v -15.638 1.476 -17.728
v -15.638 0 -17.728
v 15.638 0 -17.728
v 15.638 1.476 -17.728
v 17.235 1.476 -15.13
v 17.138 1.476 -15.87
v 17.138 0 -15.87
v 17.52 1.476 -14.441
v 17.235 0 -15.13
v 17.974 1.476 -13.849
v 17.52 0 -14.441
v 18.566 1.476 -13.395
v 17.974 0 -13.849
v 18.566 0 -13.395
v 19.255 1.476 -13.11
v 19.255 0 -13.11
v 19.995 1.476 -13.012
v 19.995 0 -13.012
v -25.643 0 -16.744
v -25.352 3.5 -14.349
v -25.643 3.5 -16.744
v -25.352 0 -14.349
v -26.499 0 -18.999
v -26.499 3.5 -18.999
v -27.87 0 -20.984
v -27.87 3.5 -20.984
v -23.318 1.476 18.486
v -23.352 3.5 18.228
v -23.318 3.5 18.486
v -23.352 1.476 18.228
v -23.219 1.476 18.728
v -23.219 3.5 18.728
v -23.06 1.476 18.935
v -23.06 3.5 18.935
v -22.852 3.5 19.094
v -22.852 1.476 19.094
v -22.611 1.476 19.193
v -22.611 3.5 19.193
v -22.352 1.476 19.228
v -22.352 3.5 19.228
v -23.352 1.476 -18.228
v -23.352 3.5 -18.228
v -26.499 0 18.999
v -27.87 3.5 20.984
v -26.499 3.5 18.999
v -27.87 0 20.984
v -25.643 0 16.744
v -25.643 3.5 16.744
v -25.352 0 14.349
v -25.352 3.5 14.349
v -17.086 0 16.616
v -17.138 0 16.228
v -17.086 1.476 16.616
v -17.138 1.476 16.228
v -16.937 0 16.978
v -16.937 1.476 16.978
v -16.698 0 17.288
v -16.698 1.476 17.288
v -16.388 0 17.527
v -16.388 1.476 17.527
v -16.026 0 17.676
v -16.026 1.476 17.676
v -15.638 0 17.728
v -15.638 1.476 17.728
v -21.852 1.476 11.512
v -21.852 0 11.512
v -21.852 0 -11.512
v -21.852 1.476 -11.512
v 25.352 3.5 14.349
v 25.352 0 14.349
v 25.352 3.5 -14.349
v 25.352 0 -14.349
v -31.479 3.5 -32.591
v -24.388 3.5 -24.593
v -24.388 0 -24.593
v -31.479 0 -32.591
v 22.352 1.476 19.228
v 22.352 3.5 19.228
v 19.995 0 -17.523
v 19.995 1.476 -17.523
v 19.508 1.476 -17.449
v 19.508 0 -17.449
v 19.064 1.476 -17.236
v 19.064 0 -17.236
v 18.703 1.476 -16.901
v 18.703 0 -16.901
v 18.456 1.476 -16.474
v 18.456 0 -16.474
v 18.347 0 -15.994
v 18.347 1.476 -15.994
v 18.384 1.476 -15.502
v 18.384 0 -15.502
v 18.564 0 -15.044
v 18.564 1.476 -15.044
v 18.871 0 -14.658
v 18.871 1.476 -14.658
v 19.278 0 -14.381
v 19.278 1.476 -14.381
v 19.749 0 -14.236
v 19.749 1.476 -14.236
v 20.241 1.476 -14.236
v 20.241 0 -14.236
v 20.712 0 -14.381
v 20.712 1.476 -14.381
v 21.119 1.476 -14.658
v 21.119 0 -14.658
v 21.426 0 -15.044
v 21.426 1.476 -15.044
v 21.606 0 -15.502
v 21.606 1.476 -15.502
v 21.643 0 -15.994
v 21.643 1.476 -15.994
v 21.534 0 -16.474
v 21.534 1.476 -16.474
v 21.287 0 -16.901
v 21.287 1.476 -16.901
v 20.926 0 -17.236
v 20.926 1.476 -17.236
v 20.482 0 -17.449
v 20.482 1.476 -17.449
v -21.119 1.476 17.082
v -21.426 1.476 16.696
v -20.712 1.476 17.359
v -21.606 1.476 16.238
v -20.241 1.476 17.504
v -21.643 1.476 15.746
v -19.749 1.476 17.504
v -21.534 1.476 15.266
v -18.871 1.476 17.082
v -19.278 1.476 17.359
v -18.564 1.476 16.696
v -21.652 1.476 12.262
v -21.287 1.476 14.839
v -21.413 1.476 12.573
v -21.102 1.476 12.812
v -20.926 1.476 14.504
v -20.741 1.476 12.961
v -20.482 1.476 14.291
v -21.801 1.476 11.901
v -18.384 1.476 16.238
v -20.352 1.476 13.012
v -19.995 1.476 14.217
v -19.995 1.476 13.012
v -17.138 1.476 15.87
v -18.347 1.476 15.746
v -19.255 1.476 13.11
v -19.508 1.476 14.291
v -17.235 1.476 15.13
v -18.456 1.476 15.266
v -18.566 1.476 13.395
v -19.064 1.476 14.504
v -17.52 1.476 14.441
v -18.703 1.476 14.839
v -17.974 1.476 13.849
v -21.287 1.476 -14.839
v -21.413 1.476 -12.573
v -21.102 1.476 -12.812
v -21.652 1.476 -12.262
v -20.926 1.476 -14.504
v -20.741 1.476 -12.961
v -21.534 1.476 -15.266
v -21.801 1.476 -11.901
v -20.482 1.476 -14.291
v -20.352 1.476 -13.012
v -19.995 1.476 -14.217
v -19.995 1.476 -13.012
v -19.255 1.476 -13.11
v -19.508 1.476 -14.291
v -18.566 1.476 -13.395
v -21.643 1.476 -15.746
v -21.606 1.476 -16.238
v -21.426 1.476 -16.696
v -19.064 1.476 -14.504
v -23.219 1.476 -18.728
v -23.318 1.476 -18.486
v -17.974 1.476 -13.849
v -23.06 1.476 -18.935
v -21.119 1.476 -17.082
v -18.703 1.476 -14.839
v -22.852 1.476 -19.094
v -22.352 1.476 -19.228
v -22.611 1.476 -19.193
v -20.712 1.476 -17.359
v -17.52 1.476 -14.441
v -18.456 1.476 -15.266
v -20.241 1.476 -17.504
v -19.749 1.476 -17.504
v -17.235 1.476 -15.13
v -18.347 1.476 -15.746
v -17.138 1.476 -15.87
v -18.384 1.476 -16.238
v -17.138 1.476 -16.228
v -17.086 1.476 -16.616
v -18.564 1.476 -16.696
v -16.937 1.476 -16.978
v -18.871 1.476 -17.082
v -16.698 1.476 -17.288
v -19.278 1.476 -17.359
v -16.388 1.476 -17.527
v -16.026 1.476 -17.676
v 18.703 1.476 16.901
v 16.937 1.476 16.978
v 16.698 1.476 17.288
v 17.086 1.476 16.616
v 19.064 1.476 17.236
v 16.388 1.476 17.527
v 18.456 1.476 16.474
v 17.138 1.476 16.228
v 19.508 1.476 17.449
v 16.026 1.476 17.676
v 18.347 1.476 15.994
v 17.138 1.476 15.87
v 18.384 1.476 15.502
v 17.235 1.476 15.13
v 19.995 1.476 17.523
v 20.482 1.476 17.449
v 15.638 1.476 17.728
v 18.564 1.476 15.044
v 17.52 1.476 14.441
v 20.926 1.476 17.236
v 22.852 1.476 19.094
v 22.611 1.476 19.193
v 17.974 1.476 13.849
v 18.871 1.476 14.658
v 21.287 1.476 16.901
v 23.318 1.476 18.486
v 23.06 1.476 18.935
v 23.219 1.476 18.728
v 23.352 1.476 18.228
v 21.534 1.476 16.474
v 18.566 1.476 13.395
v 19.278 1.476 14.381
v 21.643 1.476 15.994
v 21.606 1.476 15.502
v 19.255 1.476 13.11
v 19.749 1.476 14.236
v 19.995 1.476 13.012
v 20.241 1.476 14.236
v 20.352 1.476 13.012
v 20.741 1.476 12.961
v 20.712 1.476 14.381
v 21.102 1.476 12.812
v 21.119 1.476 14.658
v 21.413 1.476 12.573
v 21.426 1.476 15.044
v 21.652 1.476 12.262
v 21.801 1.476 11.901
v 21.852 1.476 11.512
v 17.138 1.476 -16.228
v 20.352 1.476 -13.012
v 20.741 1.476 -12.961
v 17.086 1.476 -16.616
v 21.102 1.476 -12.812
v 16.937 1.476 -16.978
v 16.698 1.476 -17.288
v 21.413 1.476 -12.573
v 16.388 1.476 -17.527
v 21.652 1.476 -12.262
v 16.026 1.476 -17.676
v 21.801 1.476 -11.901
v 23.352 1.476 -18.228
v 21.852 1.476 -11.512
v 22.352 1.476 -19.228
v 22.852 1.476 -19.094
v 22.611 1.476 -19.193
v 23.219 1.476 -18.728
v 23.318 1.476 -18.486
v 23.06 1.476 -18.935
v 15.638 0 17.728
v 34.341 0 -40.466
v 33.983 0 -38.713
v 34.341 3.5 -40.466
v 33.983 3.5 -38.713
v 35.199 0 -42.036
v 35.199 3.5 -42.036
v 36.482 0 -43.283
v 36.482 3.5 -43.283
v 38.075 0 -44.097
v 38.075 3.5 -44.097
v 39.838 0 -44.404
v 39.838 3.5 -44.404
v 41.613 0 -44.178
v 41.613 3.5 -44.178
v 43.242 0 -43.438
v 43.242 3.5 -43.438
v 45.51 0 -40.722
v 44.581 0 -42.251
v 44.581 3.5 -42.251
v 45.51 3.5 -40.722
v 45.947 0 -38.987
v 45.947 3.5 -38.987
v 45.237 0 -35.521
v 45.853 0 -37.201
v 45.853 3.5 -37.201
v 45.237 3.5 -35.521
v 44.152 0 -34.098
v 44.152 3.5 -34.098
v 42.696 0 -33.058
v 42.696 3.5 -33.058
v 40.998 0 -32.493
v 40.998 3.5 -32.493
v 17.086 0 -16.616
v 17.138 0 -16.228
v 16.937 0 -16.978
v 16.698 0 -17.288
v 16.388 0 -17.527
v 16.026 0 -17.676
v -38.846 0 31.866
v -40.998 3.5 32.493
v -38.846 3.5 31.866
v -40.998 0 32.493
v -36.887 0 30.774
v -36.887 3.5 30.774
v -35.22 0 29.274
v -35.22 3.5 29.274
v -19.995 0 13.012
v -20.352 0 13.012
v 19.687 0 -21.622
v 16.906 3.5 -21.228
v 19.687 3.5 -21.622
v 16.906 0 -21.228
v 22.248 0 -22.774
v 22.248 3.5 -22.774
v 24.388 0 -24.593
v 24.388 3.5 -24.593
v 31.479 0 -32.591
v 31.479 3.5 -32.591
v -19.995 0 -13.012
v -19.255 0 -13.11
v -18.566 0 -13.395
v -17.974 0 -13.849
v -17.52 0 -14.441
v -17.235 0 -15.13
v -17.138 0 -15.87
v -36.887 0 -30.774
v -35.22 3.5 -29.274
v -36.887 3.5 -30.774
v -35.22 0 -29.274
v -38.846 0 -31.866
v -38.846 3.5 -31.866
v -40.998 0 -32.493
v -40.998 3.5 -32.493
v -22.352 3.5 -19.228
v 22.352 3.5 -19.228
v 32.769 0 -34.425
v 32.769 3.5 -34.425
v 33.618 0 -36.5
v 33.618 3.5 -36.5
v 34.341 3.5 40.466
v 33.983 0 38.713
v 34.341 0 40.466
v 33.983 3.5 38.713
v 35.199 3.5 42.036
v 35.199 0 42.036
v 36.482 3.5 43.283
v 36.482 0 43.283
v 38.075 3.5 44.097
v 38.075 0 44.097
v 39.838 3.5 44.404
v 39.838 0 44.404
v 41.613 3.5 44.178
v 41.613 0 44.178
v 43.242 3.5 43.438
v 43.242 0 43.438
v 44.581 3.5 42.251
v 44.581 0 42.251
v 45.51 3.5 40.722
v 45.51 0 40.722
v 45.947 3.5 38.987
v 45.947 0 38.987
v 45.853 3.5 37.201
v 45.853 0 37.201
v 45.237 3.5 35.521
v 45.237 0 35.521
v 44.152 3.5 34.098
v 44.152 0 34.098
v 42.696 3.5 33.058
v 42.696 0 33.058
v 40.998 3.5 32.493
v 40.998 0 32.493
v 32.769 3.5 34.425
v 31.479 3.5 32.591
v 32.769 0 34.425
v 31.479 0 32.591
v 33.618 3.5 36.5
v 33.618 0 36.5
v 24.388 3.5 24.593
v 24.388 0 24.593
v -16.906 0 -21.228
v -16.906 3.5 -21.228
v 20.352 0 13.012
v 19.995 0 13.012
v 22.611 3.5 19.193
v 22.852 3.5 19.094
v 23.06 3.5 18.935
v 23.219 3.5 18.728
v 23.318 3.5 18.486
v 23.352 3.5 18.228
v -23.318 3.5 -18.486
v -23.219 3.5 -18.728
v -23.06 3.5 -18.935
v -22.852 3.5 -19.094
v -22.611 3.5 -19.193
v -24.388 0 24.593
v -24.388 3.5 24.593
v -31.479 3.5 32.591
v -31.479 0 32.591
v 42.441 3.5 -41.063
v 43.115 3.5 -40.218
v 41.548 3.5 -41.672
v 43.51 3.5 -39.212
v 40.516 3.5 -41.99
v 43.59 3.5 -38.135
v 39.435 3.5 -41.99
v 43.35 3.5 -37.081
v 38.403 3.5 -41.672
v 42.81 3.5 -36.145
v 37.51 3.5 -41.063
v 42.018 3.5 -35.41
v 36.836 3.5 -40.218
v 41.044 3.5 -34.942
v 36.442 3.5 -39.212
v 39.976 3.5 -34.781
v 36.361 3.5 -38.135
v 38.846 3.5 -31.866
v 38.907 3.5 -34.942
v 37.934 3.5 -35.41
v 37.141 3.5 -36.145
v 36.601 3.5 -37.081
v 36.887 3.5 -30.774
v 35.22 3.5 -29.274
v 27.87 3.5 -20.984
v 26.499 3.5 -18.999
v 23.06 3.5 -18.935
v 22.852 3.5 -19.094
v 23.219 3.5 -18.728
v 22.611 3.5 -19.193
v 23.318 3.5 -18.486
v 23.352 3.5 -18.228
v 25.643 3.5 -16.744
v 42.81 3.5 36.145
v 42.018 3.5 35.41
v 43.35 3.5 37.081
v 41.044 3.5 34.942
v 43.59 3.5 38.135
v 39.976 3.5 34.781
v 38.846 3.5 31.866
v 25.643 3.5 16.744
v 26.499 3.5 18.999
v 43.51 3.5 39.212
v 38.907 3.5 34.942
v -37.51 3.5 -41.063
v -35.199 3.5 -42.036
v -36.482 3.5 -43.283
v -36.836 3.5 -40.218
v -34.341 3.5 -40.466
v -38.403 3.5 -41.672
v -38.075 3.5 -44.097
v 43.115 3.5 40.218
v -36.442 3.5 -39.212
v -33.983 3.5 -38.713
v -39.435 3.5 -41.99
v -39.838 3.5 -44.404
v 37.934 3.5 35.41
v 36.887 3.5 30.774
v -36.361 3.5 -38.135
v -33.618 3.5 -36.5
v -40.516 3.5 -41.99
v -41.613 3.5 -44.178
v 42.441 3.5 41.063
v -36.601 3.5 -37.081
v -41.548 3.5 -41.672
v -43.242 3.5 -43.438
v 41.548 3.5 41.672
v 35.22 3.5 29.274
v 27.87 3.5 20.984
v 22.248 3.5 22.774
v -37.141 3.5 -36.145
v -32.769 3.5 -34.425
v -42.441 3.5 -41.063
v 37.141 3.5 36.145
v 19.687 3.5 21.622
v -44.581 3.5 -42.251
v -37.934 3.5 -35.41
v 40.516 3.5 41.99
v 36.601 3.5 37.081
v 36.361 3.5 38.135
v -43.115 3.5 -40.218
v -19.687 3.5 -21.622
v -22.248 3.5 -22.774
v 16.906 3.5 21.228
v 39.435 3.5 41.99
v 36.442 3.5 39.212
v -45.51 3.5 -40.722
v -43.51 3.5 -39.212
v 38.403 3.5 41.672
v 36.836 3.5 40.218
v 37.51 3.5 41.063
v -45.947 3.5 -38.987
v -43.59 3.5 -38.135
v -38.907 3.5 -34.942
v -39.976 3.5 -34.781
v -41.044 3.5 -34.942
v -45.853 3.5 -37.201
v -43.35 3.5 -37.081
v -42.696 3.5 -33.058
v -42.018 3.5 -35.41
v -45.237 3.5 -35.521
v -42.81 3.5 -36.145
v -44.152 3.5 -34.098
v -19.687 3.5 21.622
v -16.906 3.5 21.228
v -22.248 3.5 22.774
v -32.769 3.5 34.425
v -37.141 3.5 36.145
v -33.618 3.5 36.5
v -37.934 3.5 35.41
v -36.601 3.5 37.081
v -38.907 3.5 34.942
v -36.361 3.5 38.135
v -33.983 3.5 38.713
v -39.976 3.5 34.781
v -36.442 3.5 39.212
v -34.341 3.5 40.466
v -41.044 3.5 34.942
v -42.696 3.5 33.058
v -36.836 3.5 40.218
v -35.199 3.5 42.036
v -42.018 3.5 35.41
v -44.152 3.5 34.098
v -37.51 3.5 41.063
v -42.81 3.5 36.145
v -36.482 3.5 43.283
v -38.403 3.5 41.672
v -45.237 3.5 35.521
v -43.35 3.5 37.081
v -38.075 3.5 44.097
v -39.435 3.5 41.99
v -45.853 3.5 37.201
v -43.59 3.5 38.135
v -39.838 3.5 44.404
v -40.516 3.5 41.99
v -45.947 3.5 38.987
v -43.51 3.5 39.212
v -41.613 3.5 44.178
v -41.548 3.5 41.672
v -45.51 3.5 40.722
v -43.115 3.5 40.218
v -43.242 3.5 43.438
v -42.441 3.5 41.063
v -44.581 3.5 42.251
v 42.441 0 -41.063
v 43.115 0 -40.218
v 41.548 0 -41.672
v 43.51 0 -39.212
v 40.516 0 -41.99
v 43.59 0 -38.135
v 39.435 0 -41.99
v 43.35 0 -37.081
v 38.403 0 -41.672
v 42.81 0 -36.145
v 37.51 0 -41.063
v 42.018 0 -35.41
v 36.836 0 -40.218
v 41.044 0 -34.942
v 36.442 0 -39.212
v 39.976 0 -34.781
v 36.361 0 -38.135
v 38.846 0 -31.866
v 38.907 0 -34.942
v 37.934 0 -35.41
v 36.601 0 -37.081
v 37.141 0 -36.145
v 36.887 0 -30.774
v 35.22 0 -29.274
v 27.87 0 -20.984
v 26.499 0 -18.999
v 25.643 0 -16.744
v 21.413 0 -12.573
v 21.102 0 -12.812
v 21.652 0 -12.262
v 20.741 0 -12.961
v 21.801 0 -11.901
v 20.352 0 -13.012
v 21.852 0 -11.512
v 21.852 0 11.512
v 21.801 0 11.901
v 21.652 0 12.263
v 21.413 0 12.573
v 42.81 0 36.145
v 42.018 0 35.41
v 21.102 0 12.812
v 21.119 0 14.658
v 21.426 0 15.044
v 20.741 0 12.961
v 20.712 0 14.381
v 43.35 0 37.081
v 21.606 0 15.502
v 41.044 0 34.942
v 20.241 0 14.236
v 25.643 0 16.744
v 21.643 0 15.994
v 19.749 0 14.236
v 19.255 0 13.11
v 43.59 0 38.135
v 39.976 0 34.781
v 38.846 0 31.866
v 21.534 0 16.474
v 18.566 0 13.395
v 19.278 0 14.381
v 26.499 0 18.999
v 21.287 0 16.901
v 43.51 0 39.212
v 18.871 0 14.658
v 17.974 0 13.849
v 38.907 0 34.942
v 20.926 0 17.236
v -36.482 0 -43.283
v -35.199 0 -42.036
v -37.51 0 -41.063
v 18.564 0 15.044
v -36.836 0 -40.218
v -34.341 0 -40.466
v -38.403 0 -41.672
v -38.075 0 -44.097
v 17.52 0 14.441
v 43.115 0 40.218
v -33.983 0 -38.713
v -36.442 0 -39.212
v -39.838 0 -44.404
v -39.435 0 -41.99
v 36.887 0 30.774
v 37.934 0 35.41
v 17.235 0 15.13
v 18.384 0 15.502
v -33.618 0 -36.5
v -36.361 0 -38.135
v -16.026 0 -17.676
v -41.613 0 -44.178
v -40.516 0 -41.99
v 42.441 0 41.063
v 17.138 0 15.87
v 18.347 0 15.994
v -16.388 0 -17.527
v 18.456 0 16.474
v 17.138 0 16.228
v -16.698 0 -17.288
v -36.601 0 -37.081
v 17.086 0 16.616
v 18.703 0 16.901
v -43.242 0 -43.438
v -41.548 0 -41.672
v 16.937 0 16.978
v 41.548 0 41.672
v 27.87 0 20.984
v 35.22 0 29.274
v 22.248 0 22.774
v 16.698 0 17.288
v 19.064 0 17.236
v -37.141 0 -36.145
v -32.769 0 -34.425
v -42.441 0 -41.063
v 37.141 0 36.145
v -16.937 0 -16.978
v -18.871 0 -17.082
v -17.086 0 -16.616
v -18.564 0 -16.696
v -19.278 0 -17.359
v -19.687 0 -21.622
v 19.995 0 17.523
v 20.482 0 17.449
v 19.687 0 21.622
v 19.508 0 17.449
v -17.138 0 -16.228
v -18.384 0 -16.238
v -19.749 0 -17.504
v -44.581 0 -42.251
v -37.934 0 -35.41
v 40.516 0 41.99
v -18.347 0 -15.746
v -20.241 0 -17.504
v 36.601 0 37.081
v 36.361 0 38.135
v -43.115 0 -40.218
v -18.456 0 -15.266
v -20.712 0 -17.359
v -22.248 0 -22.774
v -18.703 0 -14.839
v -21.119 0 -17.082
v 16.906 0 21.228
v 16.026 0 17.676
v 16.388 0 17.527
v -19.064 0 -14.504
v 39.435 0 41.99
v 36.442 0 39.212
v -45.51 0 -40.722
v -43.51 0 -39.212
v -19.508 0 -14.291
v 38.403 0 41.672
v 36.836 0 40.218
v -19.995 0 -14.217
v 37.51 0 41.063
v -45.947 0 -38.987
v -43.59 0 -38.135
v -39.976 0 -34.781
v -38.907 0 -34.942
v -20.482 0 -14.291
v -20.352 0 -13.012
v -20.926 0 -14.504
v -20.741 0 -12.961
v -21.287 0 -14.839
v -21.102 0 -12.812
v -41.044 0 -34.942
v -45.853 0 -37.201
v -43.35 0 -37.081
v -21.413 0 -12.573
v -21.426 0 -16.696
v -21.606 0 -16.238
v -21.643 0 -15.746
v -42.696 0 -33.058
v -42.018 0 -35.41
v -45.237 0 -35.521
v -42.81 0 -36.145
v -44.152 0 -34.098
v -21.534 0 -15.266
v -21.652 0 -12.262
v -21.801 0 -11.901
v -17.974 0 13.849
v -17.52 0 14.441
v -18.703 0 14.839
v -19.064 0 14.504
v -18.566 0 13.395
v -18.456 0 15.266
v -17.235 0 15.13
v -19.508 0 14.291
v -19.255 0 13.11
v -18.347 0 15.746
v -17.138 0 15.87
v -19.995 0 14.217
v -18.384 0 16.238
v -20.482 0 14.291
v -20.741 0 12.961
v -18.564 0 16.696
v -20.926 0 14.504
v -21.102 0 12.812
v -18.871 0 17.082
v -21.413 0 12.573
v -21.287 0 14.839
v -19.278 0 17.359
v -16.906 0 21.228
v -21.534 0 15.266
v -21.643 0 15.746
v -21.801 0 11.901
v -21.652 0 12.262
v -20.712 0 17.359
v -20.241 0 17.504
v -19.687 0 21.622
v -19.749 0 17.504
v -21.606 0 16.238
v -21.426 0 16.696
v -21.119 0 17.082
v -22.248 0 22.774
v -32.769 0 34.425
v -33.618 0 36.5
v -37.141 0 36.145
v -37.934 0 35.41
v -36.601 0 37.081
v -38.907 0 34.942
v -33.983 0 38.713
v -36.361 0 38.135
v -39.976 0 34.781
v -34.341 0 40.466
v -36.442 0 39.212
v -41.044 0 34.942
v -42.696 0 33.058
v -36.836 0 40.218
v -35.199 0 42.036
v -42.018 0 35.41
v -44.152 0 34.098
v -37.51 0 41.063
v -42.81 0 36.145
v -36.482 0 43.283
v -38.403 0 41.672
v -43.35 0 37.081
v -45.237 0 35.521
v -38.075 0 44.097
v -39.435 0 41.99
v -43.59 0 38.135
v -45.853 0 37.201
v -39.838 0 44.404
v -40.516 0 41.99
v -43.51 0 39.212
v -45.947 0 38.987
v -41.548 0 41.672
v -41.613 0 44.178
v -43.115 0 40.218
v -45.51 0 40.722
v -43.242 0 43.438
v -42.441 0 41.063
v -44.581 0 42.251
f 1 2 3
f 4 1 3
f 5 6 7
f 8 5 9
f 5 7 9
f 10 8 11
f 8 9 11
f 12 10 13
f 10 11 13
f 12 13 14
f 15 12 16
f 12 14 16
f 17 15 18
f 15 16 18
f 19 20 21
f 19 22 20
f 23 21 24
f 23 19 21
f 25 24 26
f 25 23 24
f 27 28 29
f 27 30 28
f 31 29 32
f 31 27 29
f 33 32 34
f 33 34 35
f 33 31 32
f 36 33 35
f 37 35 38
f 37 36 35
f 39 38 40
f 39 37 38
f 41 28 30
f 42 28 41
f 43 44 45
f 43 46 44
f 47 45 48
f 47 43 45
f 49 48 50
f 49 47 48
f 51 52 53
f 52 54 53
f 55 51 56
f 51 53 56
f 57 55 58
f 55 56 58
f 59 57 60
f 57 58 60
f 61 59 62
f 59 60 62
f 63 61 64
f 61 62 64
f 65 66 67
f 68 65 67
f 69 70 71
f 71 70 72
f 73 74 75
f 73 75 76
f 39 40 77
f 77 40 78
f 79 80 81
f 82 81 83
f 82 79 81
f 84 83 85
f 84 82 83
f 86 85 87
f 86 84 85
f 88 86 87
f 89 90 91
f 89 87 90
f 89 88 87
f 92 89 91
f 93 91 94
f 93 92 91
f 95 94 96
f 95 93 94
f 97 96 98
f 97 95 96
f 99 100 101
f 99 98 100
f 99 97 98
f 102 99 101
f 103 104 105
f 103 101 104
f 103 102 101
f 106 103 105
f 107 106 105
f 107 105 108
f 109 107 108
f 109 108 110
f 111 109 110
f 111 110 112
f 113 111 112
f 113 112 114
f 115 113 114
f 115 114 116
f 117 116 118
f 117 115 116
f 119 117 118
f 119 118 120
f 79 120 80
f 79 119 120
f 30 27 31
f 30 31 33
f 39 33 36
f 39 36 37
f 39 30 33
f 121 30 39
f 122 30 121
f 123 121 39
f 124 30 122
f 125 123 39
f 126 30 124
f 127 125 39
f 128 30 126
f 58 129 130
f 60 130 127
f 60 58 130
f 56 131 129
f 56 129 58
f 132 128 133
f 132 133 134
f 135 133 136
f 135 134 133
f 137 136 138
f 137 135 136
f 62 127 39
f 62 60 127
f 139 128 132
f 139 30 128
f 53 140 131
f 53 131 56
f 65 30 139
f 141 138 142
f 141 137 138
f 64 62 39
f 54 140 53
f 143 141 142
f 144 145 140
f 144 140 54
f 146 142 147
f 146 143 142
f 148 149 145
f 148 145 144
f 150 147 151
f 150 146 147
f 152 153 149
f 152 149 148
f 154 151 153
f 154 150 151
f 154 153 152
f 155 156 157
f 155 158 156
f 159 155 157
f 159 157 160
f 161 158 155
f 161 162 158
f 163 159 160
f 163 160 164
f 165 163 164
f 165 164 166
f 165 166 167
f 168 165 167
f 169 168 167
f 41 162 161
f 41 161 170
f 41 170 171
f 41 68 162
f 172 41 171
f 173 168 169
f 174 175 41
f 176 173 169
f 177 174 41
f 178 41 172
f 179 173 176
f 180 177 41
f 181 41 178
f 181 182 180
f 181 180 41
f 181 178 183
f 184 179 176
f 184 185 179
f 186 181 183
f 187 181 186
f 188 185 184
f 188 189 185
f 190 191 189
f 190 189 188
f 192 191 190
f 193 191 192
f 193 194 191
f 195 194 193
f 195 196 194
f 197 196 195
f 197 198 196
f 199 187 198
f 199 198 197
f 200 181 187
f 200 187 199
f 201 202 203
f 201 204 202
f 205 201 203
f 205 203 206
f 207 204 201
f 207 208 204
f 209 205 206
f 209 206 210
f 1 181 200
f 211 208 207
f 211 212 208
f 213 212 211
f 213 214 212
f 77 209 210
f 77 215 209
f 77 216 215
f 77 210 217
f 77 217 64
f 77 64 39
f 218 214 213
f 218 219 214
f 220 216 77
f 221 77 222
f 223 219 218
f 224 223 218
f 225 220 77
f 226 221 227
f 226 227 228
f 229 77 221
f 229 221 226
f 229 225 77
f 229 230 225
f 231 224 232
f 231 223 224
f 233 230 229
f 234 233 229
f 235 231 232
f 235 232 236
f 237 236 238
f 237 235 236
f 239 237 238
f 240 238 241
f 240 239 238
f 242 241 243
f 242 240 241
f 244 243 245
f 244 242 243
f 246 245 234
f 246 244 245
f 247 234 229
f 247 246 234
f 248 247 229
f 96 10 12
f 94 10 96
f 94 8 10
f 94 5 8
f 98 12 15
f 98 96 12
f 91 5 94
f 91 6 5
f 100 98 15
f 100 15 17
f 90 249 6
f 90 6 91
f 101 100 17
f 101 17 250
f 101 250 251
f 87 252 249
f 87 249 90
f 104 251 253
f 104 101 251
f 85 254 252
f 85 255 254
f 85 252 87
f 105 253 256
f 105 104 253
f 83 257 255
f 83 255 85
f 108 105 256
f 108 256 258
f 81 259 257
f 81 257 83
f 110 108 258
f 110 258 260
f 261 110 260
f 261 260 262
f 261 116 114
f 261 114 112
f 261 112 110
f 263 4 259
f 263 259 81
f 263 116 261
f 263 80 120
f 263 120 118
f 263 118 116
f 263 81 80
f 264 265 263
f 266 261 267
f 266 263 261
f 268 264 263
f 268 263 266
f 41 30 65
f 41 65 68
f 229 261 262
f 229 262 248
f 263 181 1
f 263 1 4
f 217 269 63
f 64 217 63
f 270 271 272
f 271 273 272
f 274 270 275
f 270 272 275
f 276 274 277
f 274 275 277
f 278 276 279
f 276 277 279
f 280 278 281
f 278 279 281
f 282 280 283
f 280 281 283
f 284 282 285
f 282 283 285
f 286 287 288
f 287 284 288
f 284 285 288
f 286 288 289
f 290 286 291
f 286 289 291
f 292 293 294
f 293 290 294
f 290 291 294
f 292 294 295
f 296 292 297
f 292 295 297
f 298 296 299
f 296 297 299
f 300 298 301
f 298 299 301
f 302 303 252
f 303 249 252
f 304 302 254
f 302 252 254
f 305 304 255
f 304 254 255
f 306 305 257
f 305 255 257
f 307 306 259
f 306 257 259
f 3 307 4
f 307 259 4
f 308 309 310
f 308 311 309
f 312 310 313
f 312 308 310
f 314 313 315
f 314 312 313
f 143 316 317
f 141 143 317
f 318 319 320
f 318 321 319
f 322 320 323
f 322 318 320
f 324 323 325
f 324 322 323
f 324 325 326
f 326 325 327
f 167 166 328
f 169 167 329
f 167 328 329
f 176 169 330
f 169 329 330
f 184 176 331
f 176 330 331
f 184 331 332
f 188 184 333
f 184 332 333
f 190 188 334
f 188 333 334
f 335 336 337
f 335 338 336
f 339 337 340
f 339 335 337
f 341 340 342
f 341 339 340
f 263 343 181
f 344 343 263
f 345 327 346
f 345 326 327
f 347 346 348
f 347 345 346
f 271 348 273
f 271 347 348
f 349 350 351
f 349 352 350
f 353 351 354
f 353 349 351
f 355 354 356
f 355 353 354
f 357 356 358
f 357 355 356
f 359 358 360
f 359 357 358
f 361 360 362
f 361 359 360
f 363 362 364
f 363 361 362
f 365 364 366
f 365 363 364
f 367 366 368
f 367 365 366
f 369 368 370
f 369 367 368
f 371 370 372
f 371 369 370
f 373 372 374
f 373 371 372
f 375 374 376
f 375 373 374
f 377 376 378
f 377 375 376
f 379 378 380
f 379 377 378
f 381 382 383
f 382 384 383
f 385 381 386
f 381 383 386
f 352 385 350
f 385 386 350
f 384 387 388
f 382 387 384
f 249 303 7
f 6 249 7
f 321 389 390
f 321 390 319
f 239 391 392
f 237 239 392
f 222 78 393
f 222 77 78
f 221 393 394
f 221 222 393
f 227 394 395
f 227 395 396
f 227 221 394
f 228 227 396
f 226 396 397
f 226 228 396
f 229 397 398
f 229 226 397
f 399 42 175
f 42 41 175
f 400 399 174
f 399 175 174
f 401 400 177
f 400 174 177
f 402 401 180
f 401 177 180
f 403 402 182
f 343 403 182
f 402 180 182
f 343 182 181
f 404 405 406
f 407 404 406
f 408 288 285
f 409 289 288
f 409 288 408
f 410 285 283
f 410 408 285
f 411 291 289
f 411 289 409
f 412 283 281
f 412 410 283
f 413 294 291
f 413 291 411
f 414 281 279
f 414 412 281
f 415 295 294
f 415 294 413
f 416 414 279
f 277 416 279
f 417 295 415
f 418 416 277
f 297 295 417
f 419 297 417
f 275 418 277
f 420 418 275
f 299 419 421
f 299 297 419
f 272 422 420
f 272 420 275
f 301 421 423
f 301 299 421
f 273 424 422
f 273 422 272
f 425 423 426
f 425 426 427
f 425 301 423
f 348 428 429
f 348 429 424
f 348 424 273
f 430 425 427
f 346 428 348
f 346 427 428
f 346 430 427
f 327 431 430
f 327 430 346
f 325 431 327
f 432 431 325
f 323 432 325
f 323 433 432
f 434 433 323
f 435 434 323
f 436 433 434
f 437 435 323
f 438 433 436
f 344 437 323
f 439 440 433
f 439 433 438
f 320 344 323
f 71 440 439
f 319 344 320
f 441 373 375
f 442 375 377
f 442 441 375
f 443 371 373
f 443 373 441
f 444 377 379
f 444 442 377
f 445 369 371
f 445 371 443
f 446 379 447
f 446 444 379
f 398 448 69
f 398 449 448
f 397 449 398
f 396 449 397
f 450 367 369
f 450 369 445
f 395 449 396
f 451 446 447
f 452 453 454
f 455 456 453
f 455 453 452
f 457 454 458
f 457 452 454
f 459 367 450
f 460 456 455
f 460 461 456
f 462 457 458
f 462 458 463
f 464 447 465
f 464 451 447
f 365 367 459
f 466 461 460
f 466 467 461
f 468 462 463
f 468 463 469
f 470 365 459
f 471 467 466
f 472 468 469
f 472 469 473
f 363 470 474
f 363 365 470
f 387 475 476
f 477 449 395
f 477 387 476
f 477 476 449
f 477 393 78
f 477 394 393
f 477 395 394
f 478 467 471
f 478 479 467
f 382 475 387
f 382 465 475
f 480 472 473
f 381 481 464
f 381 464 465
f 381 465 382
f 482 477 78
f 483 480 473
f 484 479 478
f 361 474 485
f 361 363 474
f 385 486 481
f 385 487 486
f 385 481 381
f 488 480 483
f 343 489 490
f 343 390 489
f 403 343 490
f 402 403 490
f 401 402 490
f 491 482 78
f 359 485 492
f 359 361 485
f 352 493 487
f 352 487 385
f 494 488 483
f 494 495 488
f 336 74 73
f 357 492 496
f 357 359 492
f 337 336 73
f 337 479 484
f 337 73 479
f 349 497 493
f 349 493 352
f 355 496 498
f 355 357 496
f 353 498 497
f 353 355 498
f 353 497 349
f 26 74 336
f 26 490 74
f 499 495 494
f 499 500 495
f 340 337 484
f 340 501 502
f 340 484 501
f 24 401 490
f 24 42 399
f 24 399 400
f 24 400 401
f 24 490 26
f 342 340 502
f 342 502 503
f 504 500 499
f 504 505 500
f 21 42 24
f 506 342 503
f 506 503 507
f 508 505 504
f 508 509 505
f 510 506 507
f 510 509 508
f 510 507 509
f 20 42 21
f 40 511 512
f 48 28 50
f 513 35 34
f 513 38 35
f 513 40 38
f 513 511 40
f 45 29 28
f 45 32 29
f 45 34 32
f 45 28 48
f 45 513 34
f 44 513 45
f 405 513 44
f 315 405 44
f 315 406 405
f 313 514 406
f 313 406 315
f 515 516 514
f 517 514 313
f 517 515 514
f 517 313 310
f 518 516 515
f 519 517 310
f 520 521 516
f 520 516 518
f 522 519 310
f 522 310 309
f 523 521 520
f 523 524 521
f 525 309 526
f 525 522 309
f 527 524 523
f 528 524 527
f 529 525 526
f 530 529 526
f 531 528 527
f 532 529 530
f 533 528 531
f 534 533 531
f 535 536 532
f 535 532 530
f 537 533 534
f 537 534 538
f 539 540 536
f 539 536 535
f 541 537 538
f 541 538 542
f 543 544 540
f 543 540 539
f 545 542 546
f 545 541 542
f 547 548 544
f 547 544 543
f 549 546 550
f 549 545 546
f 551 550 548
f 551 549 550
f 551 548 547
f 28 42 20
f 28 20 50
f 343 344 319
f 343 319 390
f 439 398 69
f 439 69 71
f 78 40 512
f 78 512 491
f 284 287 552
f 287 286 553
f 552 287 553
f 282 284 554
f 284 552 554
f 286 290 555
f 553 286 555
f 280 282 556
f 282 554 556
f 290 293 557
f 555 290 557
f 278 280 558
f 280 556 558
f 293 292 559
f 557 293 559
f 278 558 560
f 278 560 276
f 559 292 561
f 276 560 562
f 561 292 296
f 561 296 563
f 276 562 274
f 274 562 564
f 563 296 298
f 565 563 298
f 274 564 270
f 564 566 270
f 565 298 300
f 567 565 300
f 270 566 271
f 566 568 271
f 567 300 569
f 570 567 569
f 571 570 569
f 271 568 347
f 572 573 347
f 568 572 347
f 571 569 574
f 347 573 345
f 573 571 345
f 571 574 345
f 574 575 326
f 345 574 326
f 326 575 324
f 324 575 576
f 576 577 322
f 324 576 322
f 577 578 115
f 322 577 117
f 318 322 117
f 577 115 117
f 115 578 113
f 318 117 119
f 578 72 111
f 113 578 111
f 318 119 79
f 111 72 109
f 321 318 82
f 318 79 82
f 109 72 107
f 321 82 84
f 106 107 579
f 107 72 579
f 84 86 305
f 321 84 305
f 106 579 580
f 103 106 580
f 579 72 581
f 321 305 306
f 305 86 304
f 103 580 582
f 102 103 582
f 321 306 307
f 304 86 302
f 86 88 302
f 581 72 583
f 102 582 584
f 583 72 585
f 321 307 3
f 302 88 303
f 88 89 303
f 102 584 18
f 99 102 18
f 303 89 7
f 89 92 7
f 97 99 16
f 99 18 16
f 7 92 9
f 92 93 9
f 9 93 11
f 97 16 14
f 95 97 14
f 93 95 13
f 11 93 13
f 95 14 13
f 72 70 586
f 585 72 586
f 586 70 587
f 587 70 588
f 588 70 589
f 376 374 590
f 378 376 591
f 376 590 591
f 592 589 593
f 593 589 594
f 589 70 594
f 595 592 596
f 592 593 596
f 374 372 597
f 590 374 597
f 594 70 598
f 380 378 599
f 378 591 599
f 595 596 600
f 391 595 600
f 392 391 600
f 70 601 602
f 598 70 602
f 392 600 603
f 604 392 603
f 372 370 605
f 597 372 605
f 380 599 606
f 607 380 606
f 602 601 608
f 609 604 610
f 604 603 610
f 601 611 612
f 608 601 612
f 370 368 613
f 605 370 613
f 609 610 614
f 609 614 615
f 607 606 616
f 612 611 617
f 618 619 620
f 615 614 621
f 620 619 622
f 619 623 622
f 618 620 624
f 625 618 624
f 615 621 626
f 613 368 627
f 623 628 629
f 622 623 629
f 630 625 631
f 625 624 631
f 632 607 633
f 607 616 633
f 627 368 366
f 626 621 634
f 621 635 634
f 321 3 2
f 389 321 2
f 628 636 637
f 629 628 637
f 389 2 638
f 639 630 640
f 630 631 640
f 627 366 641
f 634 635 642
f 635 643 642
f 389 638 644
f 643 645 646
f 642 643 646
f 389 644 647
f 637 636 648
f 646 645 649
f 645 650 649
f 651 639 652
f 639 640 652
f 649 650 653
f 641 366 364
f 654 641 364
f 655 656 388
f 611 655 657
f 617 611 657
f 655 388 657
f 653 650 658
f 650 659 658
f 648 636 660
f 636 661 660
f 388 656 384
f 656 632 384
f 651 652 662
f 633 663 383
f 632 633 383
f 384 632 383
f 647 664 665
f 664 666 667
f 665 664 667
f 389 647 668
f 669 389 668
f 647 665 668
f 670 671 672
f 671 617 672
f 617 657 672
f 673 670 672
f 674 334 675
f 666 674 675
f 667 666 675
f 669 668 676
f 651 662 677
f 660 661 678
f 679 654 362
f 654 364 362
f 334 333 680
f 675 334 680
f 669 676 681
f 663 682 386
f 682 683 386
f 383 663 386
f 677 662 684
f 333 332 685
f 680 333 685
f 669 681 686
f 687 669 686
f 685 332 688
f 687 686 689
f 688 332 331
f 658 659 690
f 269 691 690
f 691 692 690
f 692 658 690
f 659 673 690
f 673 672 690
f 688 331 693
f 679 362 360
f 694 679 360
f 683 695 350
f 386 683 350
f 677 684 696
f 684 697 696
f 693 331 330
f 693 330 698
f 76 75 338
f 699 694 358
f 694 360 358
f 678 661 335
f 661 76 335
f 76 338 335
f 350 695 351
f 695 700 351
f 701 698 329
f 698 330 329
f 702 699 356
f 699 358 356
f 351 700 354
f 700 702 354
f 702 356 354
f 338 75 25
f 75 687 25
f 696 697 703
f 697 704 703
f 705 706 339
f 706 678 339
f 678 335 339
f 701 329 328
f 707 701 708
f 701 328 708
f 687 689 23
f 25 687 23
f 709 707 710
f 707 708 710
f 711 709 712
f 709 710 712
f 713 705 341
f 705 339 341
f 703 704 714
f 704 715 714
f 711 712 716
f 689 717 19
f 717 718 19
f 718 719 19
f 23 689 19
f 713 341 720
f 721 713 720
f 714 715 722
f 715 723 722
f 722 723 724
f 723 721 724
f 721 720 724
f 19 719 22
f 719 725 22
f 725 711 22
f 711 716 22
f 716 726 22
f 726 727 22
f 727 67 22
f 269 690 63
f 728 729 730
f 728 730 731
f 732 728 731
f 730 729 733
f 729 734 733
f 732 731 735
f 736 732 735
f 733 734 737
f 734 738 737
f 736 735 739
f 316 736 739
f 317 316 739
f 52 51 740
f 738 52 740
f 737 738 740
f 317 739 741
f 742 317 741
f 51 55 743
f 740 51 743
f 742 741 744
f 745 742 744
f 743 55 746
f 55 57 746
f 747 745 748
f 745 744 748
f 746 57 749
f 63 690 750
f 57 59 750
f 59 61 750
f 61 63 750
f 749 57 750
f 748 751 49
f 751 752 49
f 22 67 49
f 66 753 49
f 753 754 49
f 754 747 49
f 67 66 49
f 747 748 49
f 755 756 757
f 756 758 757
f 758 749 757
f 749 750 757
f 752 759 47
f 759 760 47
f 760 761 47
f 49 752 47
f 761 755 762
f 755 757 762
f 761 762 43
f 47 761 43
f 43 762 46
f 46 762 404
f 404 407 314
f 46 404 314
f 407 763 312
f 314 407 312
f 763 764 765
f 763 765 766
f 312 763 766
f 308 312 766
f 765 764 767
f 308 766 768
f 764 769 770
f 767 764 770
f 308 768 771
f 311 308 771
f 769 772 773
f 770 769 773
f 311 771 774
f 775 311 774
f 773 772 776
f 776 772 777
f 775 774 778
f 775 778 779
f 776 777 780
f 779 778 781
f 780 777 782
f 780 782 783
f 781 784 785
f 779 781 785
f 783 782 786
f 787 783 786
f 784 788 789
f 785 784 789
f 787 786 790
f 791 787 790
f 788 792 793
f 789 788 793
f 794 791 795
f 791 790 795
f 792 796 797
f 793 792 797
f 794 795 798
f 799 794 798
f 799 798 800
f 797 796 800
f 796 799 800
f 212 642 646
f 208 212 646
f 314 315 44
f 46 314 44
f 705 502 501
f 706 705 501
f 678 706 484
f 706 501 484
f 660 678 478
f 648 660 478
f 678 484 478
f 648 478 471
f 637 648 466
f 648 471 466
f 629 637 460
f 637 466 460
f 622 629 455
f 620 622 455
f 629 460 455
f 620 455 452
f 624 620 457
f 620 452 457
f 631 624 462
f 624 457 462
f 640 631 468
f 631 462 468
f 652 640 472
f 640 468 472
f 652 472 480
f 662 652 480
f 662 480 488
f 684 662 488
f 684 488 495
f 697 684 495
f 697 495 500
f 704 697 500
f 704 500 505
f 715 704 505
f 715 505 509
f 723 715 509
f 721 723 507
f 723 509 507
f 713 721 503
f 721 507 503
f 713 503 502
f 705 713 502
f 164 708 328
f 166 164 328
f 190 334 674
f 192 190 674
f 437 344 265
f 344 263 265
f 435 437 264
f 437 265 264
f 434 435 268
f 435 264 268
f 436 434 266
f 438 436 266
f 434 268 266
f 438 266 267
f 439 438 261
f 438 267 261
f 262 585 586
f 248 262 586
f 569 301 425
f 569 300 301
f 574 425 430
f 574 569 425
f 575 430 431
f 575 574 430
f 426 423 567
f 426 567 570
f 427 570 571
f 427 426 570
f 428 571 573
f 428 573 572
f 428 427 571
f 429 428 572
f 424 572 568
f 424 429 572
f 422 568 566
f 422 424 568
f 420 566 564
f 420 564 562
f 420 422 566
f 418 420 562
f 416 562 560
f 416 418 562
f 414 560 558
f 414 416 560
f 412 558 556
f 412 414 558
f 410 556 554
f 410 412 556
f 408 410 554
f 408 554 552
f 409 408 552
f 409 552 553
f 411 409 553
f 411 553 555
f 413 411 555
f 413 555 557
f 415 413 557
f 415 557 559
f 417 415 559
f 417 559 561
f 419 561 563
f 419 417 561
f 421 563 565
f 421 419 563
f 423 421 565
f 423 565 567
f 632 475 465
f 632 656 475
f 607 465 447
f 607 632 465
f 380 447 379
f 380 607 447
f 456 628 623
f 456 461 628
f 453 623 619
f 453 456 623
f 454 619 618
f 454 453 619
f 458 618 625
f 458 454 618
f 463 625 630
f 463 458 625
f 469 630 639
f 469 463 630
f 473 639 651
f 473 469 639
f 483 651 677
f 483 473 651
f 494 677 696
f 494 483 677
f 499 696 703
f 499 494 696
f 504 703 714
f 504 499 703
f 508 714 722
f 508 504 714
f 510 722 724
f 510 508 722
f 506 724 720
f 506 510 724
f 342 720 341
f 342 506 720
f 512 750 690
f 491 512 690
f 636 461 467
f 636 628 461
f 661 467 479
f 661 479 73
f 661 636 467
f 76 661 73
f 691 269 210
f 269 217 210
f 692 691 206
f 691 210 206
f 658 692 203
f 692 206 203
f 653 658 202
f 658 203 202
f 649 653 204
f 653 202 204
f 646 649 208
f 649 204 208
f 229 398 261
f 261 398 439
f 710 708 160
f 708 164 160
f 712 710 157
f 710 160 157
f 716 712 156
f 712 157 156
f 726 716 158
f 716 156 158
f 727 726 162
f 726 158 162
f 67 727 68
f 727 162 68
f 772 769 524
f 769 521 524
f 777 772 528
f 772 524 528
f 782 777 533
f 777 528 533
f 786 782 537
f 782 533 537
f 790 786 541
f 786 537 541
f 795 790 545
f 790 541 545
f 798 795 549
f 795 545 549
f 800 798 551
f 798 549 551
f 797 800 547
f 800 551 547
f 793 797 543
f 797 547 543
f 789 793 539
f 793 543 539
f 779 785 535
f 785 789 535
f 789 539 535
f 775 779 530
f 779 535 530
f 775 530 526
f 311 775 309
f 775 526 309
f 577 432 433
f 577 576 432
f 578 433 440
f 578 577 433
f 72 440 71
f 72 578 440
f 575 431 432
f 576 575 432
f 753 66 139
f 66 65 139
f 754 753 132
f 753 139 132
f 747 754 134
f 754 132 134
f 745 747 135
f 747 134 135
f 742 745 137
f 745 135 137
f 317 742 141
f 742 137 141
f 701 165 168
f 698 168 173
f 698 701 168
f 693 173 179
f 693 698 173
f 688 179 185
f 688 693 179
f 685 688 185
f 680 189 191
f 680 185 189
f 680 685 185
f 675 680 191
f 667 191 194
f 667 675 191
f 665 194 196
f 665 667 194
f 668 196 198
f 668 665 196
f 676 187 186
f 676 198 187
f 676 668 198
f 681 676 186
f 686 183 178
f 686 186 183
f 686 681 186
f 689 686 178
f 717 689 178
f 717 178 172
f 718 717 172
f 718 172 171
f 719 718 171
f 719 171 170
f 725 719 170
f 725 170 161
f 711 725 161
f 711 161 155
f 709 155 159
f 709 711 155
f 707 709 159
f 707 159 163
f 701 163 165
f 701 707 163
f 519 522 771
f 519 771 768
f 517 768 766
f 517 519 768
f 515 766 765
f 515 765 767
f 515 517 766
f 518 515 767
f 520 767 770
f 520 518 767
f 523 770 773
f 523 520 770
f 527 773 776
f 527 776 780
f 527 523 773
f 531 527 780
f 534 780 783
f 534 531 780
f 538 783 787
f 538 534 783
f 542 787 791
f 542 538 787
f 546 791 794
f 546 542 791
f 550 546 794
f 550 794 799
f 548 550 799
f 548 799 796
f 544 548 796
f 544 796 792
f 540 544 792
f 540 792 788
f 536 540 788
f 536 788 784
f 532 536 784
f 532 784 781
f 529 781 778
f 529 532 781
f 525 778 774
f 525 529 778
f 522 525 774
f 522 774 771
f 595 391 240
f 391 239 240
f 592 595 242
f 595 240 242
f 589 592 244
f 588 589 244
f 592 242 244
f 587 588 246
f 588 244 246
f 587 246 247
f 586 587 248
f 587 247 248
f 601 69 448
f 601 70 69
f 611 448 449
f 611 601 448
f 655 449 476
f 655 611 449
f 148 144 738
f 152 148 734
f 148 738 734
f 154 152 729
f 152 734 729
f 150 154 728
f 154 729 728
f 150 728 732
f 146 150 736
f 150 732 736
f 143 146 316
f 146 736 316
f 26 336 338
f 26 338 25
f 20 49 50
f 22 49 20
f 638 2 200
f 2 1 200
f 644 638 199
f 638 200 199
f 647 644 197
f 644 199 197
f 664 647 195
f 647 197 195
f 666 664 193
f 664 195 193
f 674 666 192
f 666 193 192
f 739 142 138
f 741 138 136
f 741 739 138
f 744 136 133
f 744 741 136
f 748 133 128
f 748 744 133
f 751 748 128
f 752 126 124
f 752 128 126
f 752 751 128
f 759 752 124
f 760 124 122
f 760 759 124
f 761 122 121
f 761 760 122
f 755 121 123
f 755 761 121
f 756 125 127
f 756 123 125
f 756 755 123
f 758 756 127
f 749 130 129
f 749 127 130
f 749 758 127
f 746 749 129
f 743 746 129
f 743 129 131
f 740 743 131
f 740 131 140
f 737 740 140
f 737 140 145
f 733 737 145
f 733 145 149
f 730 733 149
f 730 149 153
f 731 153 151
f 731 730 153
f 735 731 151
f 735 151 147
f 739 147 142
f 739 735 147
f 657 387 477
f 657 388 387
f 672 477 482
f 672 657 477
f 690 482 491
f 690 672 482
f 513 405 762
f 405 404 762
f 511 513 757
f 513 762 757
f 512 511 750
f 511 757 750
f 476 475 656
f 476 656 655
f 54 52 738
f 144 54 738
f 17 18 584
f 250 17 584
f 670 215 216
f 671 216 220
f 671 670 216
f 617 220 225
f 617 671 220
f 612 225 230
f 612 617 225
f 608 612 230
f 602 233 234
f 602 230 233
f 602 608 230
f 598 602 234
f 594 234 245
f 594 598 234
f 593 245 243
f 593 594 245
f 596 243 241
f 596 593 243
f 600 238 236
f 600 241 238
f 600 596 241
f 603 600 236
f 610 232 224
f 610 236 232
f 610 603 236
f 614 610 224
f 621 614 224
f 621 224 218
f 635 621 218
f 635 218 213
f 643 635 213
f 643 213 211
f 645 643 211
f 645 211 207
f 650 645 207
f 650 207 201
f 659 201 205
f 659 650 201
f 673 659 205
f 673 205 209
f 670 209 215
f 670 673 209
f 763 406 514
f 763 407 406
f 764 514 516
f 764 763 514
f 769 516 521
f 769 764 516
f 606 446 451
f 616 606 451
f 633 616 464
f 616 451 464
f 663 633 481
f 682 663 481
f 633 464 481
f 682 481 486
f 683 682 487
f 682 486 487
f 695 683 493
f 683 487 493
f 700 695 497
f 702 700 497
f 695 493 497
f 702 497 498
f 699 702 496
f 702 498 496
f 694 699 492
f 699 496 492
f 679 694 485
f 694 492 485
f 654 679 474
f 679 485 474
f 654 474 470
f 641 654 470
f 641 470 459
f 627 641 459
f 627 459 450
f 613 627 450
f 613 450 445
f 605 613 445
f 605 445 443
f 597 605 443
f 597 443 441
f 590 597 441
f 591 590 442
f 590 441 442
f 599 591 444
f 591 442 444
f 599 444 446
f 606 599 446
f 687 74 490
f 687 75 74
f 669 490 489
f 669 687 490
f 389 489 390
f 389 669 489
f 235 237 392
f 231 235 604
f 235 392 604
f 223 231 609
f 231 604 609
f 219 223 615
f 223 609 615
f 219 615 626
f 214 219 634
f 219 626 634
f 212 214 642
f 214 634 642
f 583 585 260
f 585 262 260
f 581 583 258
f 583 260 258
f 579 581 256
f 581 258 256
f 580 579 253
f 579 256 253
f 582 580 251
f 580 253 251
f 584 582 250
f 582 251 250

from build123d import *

# Parameters (mm, degrees)
SKETCH1_W                 = 50.705
SKETCH1_H                 = 42.455
SKETCH1_R                 = 1.65288
BOSS_EXTRUDE1_DEPTH       = 3.5
SKETCH2_W                 = 46.705
SKETCH2_H                 = 38.455
CUT_EXTRUDE1_DEPTH        = 2.024
SKETCH3_R                 = 6
SKETCH3_R_2               = 3.625
BOSS_EXTRUDE2_DEPTH       = 3.5
FILLET2_R                 = 1.5
FILLET3_R                 = 1
MIRROR2_COPY_1_SKETCH_R   = 6
MIRROR2_COPY_1_SKETCH_R_2 = 3.625
MIRROR2_COPY_1_DEPTH      = 3.5
FILLET1_R                 = 10


with BuildPart() as part:
    # Sketch1 → Boss-Extrude1 (new body)
    with BuildSketch(Plane(origin=(0, 0, 0), x_dir=(1, 0, 0), z_dir=(0, 1, 0))):
        Rectangle(SKETCH1_W, SKETCH1_H)
        with Locations(Location((-19.995, 15.87, 0), (0, 0, 270))):
            Circle(SKETCH1_R, mode=Mode.SUBTRACT)
        with Locations(Location((19.995, 15.87, 0), (0, 0, 90))):
            Circle(SKETCH1_R, mode=Mode.SUBTRACT)
        with Locations(Location((19.995, -15.87, 0), (0, 0, 270))):
            Circle(SKETCH1_R, mode=Mode.SUBTRACT)
        with Locations(Location((-19.995, -15.87, 0), (0, 0, 90))):
            Circle(SKETCH1_R, mode=Mode.SUBTRACT)
        with BuildLine():
            Line((21.8525, 13.0125), (21.8525, -13.0125))
            Line((21.8525, -13.0125), (19.995, -13.0125))
            ThreePointArc((19.995, -13.0125), (17.974442373, -13.849442373), (17.1375, -15.87))
            Line((17.1375, -15.87), (17.1375, -17.7275))
            Line((17.1375, -17.7275), (-17.1375, -17.7275))
            Line((-17.1375, -17.7275), (-17.1375, -15.87))
            ThreePointArc((-17.1375, -15.87), (-17.974442373, -13.849442373), (-19.995, -13.0125))
            Line((-19.995, -13.0125), (-21.8525, -13.0125))
            Line((-21.8525, -13.0125), (-21.8525, 13.0125))
            Line((-21.8525, 13.0125), (-19.995, 13.0125))
            ThreePointArc((-19.995, 13.0125), (-17.974442373, 13.849442373), (-17.1375, 15.87))
            Line((-17.1375, 15.87), (-17.1375, 17.7275))
            Line((-17.1375, 17.7275), (17.1375, 17.7275))
            Line((17.1375, 17.7275), (17.1375, 15.87))
            ThreePointArc((17.1375, 15.87), (17.974442373, 13.849442373), (19.995, 13.0125))
            Line((19.995, 13.0125), (21.8525, 13.0125))
        make_face(mode=Mode.SUBTRACT)
    extrude(amount=BOSS_EXTRUDE1_DEPTH)

    # Sketch2 → Cut-Extrude1 (cut)
    with BuildSketch(Plane(origin=(0, 3.5, 0), x_dir=(1, 0, 0), z_dir=(0, 1, 0))):
        Rectangle(SKETCH2_W, SKETCH2_H)
    extrude(amount=-CUT_EXTRUDE1_DEPTH, mode=Mode.SUBTRACT)

    # Sketch3 → Boss-Extrude2 (add)
    # profile 1 of 3: a face of its own
    with BuildSketch(Plane(origin=(0, 3.5, 0), x_dir=(1, 0, 0), z_dir=(0, 1, 0))):
        with BuildLine():
            Line((-25.3525, 21.2275), (-21.403966459, 21.2275))
            Line((-21.403966459, 21.2275), (-34.48647943, 35.98289392))
            ThreePointArc((-34.48647943, 35.98289392), (-35.995113658, 33.91607267), (-38.227727219, 32.665807098))
            Line((-38.227727219, 32.665807098), (-25.3525, 18.144204877))
            Line((-25.3525, 18.144204877), (-25.3525, 21.2275))
        make_face()
    # profile 2 of 3: a face of its own
    with BuildSketch(Plane(origin=(0, 3.5, 0), x_dir=(1, 0, 0), z_dir=(0, 1, 0))):
        Polygon((-23.891843474, 20.265138811), (-20.550712197, 20.265138811), (-21.403966459, 21.2275), (-25.3525, 21.2275), (-25.3525, 18.144204877), (-24.536212364, 17.223537292), align=None)
    # profile 3 of 3: a face of its own
    with BuildSketch(Plane(origin=(0, 3.5, 0), x_dir=(1, 0, 0), z_dir=(0, 1, 0))):
        with Locations((-39.975617845, 38.405570016)):
            Circle(SKETCH3_R)
        with Locations(Location((-39.975617845, 38.405570016, 0), (0, 0, 270))):
            Circle(SKETCH3_R_2, mode=Mode.SUBTRACT)
    boss_extrude2 = extrude(amount=-BOSS_EXTRUDE2_DEPTH)

    # Fillet2
    fillet2_edges = [part.edges().sort_by_distance(p)[0] for p in [
        (21.8525, 0.738, -13.0125),
        (21.8525, 0.738, 13.0125),
        (17.1375, 0.738, 17.7275),
        (-17.1375, 0.738, 17.7275),
        (-21.8525, 0.738, 13.0125),
        (-21.8525, 0.738, -13.0125),
        (-17.1375, 0.738, -17.7275),
        (17.1375, 0.738, -17.7275),
    ]]
    fillet(fillet2_edges, radius=FILLET2_R)

    # Fillet3
    fillet3_edges = [part.edges().sort_by_distance(p)[0] for p in [
        (-23.3525, 2.488, 19.2275),
        (-23.3525, 2.488, -19.2275),
        (23.3525, 2.488, -19.2275),
        (23.3525, 2.488, 19.2275),
    ]]
    fillet(fillet3_edges, radius=FILLET3_R)

    # Mirror1: Boss-Extrude2 across plane
    add(boss_extrude2.mirror(Plane.XY))

    # Mirror2: Boss-Extrude2 across plane
    add(boss_extrude2.mirror(Plane(origin=(0, 0, 0), x_dir=(0, 0, 1), z_dir=(1, 0, 0))))

    # Mirror2 copy 1 sketch → Mirror2 copy 1 (add)
    # profile 1 of 3: a face of its own
    with BuildSketch(Plane(origin=(0, 3.5, 0), x_dir=(-1, 0, 0), z_dir=(0, 1, 0))):
        with BuildLine():
            Line((-25.3525, 21.2275), (-21.403966459, 21.2275))
            Line((-21.403966459, 21.2275), (-34.48647943, 35.98289392))
            ThreePointArc((-34.48647943, 35.98289392), (-35.995113658, 33.91607267), (-38.227727219, 32.665807098))
            Line((-38.227727219, 32.665807098), (-25.3525, 18.144204877))
            Line((-25.3525, 18.144204877), (-25.3525, 21.2275))
        make_face()
    # profile 2 of 3: a face of its own
    with BuildSketch(Plane(origin=(0, 3.5, 0), x_dir=(-1, 0, 0), z_dir=(0, 1, 0))):
        Polygon((-23.891843474, 20.265138811), (-20.550712197, 20.265138811), (-21.403966459, 21.2275), (-25.3525, 21.2275), (-25.3525, 18.144204877), (-24.536212364, 17.223537292), align=None)
    # profile 3 of 3: a face of its own
    with BuildSketch(Plane(origin=(0, 3.5, 0), x_dir=(-1, 0, 0), z_dir=(0, 1, 0))):
        with Locations((-39.975617845, 38.405570016)):
            Circle(MIRROR2_COPY_1_SKETCH_R)
        with Locations(Location((-39.975617845, 38.405570016, 0), (0, 0, 270))):
            Circle(MIRROR2_COPY_1_SKETCH_R_2, mode=Mode.SUBTRACT)
    extrude(amount=-MIRROR2_COPY_1_DEPTH)

    # Fillet1
    fillet1_edges = [part.edges().sort_by_distance(p)[0] for p in [
        (-25.3525, 1.75, -18.144204877),
        (-21.403966459, 1.75, -21.2275),
        (-34.48647943, 1.75, -35.98289392),
        (-38.227727219, 1.75, -32.665807098),
        (-21.403966459, 1.75, 21.2275),
        (-38.227727219, 1.75, 32.665807098),
        (-34.48647943, 1.75, 35.98289392),
        (-25.3525, 1.75, 18.144204877),
        (25.3525, 1.75, 18.144204877),
        (34.48647943, 1.75, 35.98289392),
        (38.227727219, 1.75, 32.665807098),
        (21.403966459, 1.75, 21.2275),
        (21.403966459, 1.75, -21.2275),
        (38.227727219, 1.75, -32.665807098),
        (34.48647943, 1.75, -35.98289392),
        (25.3525, 1.75, -18.144204877),
    ]]
    fillet(fillet1_edges, radius=FILLET1_R)


solid = part.part
